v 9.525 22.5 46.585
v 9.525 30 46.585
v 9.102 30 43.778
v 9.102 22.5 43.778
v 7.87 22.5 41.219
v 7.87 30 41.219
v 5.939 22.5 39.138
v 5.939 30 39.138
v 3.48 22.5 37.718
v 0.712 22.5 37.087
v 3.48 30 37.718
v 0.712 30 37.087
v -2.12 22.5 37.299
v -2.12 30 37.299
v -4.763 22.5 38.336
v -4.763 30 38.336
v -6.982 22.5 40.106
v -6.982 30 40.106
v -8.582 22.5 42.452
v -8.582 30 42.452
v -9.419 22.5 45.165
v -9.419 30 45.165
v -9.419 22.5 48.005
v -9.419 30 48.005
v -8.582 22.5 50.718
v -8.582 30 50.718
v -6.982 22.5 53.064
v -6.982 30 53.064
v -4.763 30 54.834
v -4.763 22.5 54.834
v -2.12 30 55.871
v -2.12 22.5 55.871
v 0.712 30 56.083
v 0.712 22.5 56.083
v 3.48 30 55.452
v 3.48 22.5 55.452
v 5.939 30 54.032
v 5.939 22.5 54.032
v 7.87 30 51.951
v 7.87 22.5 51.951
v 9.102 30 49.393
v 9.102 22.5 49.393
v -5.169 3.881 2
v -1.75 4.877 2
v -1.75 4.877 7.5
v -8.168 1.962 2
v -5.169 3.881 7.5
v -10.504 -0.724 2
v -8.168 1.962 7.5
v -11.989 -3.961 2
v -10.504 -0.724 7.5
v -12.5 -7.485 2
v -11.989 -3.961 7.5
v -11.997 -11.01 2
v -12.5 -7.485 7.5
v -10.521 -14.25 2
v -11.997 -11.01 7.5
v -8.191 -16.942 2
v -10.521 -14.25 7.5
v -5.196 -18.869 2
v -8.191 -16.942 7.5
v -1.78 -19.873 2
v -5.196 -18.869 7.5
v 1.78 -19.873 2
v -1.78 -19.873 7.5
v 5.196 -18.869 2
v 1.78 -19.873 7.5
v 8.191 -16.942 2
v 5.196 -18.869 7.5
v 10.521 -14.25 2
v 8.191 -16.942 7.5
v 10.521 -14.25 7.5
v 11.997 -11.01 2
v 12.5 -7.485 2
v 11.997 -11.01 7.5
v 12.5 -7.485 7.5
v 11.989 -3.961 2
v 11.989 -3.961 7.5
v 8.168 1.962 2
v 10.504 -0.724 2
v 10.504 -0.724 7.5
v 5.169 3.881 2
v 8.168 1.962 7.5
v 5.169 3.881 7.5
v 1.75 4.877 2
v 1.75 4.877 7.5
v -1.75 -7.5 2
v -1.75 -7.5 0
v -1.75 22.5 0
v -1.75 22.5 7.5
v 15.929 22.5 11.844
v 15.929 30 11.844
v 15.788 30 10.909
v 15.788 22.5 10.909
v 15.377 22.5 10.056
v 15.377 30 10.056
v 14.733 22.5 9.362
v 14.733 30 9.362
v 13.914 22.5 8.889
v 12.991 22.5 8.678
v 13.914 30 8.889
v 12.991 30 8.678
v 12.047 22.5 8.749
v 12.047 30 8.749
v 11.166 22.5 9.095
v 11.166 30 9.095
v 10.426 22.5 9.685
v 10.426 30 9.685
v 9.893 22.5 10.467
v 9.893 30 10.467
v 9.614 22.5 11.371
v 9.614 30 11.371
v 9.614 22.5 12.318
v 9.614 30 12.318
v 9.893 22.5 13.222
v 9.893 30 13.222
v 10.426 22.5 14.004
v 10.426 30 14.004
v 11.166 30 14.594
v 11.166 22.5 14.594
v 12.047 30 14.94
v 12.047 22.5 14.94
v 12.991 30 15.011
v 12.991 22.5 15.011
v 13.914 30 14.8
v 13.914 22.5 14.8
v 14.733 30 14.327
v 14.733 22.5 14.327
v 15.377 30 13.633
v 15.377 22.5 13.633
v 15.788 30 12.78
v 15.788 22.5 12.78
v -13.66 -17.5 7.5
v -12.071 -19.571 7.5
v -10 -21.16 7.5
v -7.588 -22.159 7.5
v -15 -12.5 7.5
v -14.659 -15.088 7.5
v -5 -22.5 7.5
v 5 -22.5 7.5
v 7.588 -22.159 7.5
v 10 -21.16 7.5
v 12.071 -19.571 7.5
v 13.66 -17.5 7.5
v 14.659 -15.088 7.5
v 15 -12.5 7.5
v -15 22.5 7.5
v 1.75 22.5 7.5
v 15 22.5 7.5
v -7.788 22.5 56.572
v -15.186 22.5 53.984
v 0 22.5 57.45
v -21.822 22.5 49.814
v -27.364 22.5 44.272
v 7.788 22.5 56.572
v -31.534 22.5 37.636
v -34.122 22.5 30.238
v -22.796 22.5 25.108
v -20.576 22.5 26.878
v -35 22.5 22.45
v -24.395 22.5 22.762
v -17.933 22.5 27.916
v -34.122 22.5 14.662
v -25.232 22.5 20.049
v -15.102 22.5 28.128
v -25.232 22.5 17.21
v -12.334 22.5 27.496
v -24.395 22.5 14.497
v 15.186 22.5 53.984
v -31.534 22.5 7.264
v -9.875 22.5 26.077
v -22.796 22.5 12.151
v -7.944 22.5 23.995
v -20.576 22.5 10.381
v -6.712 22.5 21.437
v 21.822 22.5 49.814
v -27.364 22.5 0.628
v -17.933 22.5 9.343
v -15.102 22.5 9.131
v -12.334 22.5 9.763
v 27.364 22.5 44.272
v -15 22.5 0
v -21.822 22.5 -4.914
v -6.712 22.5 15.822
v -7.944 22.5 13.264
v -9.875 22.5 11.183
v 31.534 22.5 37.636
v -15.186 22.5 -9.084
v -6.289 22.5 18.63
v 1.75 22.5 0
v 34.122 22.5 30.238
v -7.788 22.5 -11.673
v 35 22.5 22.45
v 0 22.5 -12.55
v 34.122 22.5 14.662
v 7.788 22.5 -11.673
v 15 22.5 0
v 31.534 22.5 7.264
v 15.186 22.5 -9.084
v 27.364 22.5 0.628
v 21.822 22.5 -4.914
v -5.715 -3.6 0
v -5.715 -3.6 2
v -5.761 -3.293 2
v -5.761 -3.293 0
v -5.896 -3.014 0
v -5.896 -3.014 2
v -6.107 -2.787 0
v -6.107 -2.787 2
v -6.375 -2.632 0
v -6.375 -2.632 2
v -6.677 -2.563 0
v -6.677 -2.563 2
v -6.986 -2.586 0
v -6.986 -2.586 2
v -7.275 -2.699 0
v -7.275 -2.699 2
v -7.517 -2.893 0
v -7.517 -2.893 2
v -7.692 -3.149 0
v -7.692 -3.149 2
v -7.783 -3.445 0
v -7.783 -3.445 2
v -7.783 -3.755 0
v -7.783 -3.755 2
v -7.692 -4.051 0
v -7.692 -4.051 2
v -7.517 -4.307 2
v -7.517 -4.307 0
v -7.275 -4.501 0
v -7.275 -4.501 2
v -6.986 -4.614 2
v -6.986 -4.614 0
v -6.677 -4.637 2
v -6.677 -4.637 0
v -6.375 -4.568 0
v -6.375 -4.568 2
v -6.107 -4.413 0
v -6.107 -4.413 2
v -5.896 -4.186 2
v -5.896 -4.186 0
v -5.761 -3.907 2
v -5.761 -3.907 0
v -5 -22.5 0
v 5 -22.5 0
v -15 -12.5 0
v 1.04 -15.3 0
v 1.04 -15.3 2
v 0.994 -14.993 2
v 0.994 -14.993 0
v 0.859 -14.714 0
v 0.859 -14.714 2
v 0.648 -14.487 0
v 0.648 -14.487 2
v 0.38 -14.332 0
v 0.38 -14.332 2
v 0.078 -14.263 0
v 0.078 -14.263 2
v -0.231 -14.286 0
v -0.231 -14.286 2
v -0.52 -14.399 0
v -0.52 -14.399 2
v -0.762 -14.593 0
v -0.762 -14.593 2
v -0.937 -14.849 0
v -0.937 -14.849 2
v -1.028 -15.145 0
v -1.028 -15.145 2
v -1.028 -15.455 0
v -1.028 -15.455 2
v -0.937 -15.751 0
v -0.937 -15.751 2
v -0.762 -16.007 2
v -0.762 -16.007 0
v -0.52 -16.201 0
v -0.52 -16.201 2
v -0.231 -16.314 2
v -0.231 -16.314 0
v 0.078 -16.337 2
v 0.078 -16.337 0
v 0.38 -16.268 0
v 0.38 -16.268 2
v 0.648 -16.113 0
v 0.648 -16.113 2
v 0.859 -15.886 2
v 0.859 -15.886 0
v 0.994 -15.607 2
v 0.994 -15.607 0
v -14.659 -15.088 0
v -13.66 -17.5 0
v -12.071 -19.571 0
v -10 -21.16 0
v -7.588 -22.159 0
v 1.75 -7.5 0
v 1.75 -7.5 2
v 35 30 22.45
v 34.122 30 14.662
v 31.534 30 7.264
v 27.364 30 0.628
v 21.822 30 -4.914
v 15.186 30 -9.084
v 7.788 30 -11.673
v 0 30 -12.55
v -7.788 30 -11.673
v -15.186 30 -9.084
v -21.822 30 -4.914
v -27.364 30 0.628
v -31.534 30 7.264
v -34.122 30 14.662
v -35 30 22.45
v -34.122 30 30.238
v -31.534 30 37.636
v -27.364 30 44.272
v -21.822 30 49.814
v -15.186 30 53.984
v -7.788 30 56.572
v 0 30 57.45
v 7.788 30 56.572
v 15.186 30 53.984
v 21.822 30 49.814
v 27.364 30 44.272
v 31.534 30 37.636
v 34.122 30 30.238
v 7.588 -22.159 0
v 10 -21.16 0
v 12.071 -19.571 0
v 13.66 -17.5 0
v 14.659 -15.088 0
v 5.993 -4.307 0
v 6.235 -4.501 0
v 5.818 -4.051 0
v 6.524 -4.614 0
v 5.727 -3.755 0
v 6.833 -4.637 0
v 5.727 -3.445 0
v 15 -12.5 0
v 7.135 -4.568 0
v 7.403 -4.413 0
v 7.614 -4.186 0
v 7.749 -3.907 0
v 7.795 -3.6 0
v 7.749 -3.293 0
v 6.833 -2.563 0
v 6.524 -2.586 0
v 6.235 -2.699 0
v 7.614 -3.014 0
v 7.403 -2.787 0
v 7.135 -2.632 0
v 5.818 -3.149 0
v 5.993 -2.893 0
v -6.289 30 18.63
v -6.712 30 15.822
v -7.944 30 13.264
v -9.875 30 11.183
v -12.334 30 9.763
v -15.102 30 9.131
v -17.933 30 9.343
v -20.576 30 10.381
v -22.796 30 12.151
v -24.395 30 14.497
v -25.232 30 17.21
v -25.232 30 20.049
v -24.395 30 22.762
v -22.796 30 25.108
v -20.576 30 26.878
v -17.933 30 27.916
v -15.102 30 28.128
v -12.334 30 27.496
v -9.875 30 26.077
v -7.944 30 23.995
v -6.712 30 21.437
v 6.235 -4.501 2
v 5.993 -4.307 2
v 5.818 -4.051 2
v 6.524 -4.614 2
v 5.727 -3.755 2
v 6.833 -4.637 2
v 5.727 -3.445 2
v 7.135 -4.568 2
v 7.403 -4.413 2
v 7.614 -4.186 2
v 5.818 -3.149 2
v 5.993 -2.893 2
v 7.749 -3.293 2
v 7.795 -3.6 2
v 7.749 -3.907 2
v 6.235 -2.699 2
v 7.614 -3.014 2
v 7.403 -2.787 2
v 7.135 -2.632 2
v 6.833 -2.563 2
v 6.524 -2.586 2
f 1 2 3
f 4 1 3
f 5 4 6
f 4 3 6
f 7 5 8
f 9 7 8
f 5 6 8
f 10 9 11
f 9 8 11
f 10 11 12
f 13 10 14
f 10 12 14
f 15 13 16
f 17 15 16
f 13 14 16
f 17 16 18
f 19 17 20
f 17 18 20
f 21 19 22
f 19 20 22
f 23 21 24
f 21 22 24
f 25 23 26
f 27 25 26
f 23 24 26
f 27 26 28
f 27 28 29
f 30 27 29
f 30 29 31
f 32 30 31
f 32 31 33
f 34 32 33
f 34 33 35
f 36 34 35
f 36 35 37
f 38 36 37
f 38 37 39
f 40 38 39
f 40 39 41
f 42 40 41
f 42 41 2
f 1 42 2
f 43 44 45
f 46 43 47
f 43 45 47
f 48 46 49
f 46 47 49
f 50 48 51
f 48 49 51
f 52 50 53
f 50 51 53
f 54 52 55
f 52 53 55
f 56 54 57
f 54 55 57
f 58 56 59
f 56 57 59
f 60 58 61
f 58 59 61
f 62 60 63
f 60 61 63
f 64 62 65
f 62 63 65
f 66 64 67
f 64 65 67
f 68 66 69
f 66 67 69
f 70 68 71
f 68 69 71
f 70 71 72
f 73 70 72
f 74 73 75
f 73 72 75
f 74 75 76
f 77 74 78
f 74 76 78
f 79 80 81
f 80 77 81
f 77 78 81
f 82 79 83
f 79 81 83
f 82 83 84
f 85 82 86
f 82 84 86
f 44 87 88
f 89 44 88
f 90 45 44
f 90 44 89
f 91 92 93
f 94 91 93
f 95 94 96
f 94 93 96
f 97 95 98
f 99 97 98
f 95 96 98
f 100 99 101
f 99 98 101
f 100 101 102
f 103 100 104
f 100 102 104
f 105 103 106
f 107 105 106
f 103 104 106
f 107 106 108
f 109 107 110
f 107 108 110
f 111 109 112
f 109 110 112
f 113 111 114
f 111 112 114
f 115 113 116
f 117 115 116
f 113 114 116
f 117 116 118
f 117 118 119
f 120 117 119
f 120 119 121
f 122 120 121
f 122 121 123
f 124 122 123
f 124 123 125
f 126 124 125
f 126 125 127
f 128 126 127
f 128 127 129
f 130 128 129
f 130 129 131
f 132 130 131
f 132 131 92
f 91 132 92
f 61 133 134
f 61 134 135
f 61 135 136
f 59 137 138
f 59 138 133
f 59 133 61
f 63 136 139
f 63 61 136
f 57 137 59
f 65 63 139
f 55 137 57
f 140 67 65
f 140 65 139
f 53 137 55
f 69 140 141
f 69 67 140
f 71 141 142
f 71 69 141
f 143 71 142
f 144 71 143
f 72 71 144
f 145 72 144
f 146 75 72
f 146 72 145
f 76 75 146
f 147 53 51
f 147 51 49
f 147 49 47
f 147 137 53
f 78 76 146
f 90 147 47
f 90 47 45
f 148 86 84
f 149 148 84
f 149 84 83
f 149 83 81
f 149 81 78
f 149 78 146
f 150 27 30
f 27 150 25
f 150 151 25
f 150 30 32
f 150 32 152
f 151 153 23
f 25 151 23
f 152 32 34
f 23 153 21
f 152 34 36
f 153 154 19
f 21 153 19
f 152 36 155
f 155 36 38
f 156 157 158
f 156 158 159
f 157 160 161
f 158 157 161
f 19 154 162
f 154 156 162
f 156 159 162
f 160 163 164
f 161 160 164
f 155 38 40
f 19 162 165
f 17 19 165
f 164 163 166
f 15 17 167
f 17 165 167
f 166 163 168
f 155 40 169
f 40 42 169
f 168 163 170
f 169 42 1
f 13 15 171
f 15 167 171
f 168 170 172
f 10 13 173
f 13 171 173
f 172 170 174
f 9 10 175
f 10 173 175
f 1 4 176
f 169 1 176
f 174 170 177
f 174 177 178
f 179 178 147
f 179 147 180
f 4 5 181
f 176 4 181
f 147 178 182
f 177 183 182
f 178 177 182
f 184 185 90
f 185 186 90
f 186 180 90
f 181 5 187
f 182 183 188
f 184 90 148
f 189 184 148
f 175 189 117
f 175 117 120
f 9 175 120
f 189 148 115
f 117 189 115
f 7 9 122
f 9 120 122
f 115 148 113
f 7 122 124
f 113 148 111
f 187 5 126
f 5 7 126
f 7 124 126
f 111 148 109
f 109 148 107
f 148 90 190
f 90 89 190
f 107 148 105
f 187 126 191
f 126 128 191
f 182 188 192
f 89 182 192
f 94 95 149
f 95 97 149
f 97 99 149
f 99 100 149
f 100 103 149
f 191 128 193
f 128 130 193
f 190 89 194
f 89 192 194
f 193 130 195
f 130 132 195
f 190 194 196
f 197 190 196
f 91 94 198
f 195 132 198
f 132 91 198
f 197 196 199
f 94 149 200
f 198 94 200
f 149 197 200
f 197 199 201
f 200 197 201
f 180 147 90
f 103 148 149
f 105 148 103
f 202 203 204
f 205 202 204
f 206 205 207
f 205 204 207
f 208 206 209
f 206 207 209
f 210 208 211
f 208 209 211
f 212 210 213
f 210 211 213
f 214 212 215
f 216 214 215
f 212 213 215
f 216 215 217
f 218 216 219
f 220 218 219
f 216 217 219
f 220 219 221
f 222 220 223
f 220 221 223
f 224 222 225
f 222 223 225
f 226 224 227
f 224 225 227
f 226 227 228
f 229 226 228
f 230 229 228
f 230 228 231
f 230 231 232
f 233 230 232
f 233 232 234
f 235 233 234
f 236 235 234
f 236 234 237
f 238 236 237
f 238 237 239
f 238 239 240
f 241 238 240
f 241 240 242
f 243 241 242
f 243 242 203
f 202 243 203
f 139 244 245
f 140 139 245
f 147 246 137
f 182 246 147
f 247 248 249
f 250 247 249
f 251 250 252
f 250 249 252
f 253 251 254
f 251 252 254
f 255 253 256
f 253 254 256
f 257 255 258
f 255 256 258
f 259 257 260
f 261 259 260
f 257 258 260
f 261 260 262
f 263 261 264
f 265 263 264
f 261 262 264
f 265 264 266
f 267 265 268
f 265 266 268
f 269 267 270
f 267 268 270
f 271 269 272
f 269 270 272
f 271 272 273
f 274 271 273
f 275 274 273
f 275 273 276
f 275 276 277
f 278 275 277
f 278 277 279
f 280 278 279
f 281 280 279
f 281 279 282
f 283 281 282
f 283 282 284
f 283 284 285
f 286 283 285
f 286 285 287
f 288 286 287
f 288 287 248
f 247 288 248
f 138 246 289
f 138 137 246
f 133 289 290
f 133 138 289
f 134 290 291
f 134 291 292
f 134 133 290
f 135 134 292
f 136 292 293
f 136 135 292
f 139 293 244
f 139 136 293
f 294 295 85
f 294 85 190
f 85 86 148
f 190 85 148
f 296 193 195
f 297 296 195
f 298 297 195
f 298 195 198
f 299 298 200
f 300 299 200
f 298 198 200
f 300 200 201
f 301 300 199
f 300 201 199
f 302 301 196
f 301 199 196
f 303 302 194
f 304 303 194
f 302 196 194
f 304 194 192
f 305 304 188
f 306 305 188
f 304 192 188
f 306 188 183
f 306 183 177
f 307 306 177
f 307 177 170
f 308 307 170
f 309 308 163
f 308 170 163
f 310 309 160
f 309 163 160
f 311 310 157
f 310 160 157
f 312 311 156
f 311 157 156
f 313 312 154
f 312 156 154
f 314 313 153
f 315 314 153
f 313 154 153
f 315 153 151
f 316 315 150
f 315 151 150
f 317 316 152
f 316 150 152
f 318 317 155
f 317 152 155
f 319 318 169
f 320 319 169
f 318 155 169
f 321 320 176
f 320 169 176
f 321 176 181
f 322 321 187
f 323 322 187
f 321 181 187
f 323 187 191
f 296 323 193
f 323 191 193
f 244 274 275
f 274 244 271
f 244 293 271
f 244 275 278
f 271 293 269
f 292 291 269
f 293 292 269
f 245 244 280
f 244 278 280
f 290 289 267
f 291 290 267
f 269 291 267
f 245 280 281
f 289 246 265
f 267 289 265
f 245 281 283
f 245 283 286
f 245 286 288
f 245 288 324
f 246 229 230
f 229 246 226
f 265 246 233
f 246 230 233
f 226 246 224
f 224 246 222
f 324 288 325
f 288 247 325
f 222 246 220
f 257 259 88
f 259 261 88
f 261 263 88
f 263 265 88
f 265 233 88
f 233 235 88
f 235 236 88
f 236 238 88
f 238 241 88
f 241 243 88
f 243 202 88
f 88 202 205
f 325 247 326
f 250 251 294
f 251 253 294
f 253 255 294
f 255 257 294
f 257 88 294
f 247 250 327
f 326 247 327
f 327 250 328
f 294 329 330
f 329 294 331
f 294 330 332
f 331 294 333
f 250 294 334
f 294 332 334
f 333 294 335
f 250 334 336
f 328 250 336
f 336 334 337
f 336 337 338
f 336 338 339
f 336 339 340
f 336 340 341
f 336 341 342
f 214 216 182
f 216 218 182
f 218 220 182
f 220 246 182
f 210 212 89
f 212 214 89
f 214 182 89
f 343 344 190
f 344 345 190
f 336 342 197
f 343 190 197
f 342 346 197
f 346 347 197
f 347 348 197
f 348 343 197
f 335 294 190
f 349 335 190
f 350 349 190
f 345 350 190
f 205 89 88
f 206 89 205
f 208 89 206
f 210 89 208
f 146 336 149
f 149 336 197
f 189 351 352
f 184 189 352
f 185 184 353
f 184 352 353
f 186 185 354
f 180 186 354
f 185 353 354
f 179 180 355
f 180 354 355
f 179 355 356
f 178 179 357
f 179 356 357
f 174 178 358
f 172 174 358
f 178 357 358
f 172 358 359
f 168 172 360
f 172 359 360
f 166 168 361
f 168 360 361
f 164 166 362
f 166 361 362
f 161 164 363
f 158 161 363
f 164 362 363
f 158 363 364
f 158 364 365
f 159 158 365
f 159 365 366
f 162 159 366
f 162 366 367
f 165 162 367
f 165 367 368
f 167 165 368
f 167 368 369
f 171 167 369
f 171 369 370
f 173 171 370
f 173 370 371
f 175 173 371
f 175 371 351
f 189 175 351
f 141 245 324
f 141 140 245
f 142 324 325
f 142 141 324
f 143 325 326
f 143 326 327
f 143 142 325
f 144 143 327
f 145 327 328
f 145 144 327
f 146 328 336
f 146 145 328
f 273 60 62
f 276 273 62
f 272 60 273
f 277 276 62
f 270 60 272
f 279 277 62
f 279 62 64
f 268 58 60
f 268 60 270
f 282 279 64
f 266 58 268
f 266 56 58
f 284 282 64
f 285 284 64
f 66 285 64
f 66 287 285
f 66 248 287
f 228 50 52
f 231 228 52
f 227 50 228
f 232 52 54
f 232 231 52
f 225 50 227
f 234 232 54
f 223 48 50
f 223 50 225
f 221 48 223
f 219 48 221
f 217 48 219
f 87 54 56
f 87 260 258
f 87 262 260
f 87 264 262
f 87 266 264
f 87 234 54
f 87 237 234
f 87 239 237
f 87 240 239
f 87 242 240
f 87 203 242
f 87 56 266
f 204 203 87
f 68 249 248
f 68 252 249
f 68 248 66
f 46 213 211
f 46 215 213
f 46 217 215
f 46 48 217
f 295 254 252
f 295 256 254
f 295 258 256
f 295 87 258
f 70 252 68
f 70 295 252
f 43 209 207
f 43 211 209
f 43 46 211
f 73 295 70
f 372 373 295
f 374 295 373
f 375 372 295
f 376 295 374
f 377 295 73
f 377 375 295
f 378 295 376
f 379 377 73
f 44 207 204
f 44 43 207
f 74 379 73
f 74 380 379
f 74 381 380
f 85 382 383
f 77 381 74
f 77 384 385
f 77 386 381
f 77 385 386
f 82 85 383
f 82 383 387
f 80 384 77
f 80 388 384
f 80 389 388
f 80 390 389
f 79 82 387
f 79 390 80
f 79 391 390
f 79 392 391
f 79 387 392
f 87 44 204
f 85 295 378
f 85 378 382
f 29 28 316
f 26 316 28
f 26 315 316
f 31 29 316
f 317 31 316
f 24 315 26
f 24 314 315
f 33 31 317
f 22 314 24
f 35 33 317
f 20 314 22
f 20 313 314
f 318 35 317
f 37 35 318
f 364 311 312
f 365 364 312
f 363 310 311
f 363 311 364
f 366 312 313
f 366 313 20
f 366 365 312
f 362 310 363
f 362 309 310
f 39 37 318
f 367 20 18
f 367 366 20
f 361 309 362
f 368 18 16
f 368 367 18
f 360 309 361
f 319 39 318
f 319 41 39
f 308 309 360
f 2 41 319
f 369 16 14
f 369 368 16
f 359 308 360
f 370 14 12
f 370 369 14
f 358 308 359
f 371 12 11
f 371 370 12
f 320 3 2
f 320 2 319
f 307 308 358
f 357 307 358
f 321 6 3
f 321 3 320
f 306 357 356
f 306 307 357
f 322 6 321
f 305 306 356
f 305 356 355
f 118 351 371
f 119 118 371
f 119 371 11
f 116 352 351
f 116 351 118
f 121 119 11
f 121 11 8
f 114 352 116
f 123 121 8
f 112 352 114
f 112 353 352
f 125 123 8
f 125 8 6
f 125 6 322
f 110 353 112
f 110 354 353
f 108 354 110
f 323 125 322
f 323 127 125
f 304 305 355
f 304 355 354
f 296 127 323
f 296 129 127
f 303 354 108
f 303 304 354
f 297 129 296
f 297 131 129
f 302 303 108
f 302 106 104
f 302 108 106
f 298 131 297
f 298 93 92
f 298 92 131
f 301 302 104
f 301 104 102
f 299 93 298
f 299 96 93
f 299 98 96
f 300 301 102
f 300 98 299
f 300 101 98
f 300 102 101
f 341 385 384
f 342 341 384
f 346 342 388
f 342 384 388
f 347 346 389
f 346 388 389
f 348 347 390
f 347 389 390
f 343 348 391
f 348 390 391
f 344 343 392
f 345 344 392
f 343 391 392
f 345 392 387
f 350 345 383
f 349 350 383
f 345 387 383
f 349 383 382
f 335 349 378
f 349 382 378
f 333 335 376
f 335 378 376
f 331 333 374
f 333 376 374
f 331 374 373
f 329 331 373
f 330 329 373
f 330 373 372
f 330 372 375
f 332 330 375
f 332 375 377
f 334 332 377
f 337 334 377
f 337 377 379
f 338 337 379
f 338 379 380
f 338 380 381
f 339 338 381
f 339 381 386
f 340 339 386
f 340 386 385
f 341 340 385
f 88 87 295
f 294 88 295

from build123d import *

# Parameters (mm, degrees)
SKETCH1_W           = 30
SKETCH1_H           = 45
BOSS_EXTRUDE1_DEPTH = 7.5
SKETCH2_R           = 12.5
CUT_EXTRUDE1_DEPTH  = 5.5
CUT_EXTRUDE2_REACH  = 4
SKETCH4_R           = 1.039999008
FILLET1_R           = 10
CUT_EXTRUDE3_REACH  = 9.5
SKETCH6_W           = 3.5
SKETCH6_H           = 34.5
SKETCH9_R           = 35
BOSS_EXTRUDE3_DEPTH = 7.5
CUT_EXTRUDE4_REACH  = 54.5
SKETCH10_R          = 9.525
SKETCH10_R_2        = 3.175


with BuildPart() as part:
    # Sketch1 → Boss-Extrude1 (new body)
    with BuildSketch(Plane.XY):
        Rectangle(SKETCH1_W, SKETCH1_H)
    extrude(amount=BOSS_EXTRUDE1_DEPTH)

    # Sketch2 → Cut-Extrude1 (cut)
    with BuildSketch(Plane.XY.offset(7.5)):
        with Locations((0, -7.5)):
            Circle(SKETCH2_R)
    extrude(amount=-CUT_EXTRUDE1_DEPTH, mode=Mode.SUBTRACT)

    # Sketch4 → Cut-Extrude2 (cut, up to next)
    with BuildSketch(Plane.XY.offset(2), mode=Mode.PRIVATE) as cut_extrude2_sk1:
        with Locations((0, -15.300000992)):
            Circle(SKETCH4_R)
    cut_extrude2_tool1 = extrude(cut_extrude2_sk1.sketch, amount=-CUT_EXTRUDE2_REACH, mode=Mode.PRIVATE) & part.part
    add(cut_extrude2_tool1.solids().sort_by_distance((0, -15.300001, 2))[0], mode=Mode.SUBTRACT)
    # Sketch4 → Cut-Extrude2 (cut, up to next)
    with BuildSketch(Plane.XY.offset(2), mode=Mode.PRIVATE) as cut_extrude2_sk2:
        with Locations((6.754999008, -3.599999504)):
            Circle(SKETCH4_R)
    cut_extrude2_tool2 = extrude(cut_extrude2_sk2.sketch, amount=-CUT_EXTRUDE2_REACH, mode=Mode.PRIVATE) & part.part
    add(cut_extrude2_tool2.solids().sort_by_distance((6.754999, -3.6, 2))[0], mode=Mode.SUBTRACT)
    # Sketch4 → Cut-Extrude2 (cut, up to next)
    with BuildSketch(Plane.XY.offset(2), mode=Mode.PRIVATE) as cut_extrude2_sk3:
        with Locations((-6.754999008, -3.599999504)):
            Circle(SKETCH4_R)
    cut_extrude2_tool3 = extrude(cut_extrude2_sk3.sketch, amount=-CUT_EXTRUDE2_REACH, mode=Mode.PRIVATE) & part.part
    add(cut_extrude2_tool3.solids().sort_by_distance((-6.754999, -3.6, 2))[0], mode=Mode.SUBTRACT)

    # Fillet1
    fillet1_edges = [part.edges().sort_by_distance(p)[0] for p in [
        (15, -22.5, 3.75),
        (-15, -22.5, 3.75),
    ]]
    fillet(fillet1_edges, radius=FILLET1_R)

    # Sketch6 → Cut-Extrude3 (cut, up to next)
    with BuildSketch(Plane.XY.offset(7.5), mode=Mode.PRIVATE) as cut_extrude3_sk1:
        with Locations((0, 9.75)):
            Rectangle(SKETCH6_W, SKETCH6_H)
    cut_extrude3_tool1 = extrude(cut_extrude3_sk1.sketch, amount=-CUT_EXTRUDE3_REACH, mode=Mode.PRIVATE) & part.part
    add(cut_extrude3_tool1.solids().sort_by_distance((0, 9.75, 7.5))[0], mode=Mode.SUBTRACT)

    # Sketch9 → Boss-Extrude3 (add)
    with BuildSketch(Plane(origin=(0, 22.5, 0), x_dir=(1, 0, 0), z_dir=(0, 1, 0))):
        with Locations((0, -22.449944321)):
            Circle(SKETCH9_R)
    extrude(amount=BOSS_EXTRUDE3_DEPTH)

    # Sketch10 → Cut-Extrude4 (cut, up to next)
    with BuildSketch(Plane(origin=(0, 30, 0), x_dir=(1, 0, 0), z_dir=(0, 1, 0)), mode=Mode.PRIVATE) as cut_extrude4_sk1:
        with Locations((0, -46.585066781)):
            Circle(SKETCH10_R)
    cut_extrude4_tool1 = extrude(cut_extrude4_sk1.sketch, amount=-CUT_EXTRUDE4_REACH, mode=Mode.PRIVATE) & part.part
    add(cut_extrude4_tool1.solids().sort_by_distance((0, 30, 46.585067))[0], mode=Mode.SUBTRACT)
    # Sketch10 → Cut-Extrude4 (cut, up to next)
    with BuildSketch(Plane(origin=(0, 30, 0), x_dir=(1, 0, 0), z_dir=(0, 1, 0)), mode=Mode.PRIVATE) as cut_extrude4_sk2:
        with Locations((-15.813770298, -18.629568863)):
            Circle(SKETCH10_R)
    cut_extrude4_tool2 = extrude(cut_extrude4_sk2.sketch, amount=-CUT_EXTRUDE4_REACH, mode=Mode.PRIVATE) & part.part
    add(cut_extrude4_tool2.solids().sort_by_distance((-15.81377, 30, 18.629569))[0], mode=Mode.SUBTRACT)
    # Sketch10 → Cut-Extrude4 (cut, up to next)
    with BuildSketch(Plane(origin=(0, 30, 0), x_dir=(1, 0, 0), z_dir=(0, 1, 0)), mode=Mode.PRIVATE) as cut_extrude4_sk3:
        with Locations((12.753899309, -11.844380068)):
            Circle(SKETCH10_R_2)
    cut_extrude4_tool3 = extrude(cut_extrude4_sk3.sketch, amount=-CUT_EXTRUDE4_REACH, mode=Mode.PRIVATE) & part.part
    add(cut_extrude4_tool3.solids().sort_by_distance((12.753899, 30, 11.84438))[0], mode=Mode.SUBTRACT)


solid = part.part
